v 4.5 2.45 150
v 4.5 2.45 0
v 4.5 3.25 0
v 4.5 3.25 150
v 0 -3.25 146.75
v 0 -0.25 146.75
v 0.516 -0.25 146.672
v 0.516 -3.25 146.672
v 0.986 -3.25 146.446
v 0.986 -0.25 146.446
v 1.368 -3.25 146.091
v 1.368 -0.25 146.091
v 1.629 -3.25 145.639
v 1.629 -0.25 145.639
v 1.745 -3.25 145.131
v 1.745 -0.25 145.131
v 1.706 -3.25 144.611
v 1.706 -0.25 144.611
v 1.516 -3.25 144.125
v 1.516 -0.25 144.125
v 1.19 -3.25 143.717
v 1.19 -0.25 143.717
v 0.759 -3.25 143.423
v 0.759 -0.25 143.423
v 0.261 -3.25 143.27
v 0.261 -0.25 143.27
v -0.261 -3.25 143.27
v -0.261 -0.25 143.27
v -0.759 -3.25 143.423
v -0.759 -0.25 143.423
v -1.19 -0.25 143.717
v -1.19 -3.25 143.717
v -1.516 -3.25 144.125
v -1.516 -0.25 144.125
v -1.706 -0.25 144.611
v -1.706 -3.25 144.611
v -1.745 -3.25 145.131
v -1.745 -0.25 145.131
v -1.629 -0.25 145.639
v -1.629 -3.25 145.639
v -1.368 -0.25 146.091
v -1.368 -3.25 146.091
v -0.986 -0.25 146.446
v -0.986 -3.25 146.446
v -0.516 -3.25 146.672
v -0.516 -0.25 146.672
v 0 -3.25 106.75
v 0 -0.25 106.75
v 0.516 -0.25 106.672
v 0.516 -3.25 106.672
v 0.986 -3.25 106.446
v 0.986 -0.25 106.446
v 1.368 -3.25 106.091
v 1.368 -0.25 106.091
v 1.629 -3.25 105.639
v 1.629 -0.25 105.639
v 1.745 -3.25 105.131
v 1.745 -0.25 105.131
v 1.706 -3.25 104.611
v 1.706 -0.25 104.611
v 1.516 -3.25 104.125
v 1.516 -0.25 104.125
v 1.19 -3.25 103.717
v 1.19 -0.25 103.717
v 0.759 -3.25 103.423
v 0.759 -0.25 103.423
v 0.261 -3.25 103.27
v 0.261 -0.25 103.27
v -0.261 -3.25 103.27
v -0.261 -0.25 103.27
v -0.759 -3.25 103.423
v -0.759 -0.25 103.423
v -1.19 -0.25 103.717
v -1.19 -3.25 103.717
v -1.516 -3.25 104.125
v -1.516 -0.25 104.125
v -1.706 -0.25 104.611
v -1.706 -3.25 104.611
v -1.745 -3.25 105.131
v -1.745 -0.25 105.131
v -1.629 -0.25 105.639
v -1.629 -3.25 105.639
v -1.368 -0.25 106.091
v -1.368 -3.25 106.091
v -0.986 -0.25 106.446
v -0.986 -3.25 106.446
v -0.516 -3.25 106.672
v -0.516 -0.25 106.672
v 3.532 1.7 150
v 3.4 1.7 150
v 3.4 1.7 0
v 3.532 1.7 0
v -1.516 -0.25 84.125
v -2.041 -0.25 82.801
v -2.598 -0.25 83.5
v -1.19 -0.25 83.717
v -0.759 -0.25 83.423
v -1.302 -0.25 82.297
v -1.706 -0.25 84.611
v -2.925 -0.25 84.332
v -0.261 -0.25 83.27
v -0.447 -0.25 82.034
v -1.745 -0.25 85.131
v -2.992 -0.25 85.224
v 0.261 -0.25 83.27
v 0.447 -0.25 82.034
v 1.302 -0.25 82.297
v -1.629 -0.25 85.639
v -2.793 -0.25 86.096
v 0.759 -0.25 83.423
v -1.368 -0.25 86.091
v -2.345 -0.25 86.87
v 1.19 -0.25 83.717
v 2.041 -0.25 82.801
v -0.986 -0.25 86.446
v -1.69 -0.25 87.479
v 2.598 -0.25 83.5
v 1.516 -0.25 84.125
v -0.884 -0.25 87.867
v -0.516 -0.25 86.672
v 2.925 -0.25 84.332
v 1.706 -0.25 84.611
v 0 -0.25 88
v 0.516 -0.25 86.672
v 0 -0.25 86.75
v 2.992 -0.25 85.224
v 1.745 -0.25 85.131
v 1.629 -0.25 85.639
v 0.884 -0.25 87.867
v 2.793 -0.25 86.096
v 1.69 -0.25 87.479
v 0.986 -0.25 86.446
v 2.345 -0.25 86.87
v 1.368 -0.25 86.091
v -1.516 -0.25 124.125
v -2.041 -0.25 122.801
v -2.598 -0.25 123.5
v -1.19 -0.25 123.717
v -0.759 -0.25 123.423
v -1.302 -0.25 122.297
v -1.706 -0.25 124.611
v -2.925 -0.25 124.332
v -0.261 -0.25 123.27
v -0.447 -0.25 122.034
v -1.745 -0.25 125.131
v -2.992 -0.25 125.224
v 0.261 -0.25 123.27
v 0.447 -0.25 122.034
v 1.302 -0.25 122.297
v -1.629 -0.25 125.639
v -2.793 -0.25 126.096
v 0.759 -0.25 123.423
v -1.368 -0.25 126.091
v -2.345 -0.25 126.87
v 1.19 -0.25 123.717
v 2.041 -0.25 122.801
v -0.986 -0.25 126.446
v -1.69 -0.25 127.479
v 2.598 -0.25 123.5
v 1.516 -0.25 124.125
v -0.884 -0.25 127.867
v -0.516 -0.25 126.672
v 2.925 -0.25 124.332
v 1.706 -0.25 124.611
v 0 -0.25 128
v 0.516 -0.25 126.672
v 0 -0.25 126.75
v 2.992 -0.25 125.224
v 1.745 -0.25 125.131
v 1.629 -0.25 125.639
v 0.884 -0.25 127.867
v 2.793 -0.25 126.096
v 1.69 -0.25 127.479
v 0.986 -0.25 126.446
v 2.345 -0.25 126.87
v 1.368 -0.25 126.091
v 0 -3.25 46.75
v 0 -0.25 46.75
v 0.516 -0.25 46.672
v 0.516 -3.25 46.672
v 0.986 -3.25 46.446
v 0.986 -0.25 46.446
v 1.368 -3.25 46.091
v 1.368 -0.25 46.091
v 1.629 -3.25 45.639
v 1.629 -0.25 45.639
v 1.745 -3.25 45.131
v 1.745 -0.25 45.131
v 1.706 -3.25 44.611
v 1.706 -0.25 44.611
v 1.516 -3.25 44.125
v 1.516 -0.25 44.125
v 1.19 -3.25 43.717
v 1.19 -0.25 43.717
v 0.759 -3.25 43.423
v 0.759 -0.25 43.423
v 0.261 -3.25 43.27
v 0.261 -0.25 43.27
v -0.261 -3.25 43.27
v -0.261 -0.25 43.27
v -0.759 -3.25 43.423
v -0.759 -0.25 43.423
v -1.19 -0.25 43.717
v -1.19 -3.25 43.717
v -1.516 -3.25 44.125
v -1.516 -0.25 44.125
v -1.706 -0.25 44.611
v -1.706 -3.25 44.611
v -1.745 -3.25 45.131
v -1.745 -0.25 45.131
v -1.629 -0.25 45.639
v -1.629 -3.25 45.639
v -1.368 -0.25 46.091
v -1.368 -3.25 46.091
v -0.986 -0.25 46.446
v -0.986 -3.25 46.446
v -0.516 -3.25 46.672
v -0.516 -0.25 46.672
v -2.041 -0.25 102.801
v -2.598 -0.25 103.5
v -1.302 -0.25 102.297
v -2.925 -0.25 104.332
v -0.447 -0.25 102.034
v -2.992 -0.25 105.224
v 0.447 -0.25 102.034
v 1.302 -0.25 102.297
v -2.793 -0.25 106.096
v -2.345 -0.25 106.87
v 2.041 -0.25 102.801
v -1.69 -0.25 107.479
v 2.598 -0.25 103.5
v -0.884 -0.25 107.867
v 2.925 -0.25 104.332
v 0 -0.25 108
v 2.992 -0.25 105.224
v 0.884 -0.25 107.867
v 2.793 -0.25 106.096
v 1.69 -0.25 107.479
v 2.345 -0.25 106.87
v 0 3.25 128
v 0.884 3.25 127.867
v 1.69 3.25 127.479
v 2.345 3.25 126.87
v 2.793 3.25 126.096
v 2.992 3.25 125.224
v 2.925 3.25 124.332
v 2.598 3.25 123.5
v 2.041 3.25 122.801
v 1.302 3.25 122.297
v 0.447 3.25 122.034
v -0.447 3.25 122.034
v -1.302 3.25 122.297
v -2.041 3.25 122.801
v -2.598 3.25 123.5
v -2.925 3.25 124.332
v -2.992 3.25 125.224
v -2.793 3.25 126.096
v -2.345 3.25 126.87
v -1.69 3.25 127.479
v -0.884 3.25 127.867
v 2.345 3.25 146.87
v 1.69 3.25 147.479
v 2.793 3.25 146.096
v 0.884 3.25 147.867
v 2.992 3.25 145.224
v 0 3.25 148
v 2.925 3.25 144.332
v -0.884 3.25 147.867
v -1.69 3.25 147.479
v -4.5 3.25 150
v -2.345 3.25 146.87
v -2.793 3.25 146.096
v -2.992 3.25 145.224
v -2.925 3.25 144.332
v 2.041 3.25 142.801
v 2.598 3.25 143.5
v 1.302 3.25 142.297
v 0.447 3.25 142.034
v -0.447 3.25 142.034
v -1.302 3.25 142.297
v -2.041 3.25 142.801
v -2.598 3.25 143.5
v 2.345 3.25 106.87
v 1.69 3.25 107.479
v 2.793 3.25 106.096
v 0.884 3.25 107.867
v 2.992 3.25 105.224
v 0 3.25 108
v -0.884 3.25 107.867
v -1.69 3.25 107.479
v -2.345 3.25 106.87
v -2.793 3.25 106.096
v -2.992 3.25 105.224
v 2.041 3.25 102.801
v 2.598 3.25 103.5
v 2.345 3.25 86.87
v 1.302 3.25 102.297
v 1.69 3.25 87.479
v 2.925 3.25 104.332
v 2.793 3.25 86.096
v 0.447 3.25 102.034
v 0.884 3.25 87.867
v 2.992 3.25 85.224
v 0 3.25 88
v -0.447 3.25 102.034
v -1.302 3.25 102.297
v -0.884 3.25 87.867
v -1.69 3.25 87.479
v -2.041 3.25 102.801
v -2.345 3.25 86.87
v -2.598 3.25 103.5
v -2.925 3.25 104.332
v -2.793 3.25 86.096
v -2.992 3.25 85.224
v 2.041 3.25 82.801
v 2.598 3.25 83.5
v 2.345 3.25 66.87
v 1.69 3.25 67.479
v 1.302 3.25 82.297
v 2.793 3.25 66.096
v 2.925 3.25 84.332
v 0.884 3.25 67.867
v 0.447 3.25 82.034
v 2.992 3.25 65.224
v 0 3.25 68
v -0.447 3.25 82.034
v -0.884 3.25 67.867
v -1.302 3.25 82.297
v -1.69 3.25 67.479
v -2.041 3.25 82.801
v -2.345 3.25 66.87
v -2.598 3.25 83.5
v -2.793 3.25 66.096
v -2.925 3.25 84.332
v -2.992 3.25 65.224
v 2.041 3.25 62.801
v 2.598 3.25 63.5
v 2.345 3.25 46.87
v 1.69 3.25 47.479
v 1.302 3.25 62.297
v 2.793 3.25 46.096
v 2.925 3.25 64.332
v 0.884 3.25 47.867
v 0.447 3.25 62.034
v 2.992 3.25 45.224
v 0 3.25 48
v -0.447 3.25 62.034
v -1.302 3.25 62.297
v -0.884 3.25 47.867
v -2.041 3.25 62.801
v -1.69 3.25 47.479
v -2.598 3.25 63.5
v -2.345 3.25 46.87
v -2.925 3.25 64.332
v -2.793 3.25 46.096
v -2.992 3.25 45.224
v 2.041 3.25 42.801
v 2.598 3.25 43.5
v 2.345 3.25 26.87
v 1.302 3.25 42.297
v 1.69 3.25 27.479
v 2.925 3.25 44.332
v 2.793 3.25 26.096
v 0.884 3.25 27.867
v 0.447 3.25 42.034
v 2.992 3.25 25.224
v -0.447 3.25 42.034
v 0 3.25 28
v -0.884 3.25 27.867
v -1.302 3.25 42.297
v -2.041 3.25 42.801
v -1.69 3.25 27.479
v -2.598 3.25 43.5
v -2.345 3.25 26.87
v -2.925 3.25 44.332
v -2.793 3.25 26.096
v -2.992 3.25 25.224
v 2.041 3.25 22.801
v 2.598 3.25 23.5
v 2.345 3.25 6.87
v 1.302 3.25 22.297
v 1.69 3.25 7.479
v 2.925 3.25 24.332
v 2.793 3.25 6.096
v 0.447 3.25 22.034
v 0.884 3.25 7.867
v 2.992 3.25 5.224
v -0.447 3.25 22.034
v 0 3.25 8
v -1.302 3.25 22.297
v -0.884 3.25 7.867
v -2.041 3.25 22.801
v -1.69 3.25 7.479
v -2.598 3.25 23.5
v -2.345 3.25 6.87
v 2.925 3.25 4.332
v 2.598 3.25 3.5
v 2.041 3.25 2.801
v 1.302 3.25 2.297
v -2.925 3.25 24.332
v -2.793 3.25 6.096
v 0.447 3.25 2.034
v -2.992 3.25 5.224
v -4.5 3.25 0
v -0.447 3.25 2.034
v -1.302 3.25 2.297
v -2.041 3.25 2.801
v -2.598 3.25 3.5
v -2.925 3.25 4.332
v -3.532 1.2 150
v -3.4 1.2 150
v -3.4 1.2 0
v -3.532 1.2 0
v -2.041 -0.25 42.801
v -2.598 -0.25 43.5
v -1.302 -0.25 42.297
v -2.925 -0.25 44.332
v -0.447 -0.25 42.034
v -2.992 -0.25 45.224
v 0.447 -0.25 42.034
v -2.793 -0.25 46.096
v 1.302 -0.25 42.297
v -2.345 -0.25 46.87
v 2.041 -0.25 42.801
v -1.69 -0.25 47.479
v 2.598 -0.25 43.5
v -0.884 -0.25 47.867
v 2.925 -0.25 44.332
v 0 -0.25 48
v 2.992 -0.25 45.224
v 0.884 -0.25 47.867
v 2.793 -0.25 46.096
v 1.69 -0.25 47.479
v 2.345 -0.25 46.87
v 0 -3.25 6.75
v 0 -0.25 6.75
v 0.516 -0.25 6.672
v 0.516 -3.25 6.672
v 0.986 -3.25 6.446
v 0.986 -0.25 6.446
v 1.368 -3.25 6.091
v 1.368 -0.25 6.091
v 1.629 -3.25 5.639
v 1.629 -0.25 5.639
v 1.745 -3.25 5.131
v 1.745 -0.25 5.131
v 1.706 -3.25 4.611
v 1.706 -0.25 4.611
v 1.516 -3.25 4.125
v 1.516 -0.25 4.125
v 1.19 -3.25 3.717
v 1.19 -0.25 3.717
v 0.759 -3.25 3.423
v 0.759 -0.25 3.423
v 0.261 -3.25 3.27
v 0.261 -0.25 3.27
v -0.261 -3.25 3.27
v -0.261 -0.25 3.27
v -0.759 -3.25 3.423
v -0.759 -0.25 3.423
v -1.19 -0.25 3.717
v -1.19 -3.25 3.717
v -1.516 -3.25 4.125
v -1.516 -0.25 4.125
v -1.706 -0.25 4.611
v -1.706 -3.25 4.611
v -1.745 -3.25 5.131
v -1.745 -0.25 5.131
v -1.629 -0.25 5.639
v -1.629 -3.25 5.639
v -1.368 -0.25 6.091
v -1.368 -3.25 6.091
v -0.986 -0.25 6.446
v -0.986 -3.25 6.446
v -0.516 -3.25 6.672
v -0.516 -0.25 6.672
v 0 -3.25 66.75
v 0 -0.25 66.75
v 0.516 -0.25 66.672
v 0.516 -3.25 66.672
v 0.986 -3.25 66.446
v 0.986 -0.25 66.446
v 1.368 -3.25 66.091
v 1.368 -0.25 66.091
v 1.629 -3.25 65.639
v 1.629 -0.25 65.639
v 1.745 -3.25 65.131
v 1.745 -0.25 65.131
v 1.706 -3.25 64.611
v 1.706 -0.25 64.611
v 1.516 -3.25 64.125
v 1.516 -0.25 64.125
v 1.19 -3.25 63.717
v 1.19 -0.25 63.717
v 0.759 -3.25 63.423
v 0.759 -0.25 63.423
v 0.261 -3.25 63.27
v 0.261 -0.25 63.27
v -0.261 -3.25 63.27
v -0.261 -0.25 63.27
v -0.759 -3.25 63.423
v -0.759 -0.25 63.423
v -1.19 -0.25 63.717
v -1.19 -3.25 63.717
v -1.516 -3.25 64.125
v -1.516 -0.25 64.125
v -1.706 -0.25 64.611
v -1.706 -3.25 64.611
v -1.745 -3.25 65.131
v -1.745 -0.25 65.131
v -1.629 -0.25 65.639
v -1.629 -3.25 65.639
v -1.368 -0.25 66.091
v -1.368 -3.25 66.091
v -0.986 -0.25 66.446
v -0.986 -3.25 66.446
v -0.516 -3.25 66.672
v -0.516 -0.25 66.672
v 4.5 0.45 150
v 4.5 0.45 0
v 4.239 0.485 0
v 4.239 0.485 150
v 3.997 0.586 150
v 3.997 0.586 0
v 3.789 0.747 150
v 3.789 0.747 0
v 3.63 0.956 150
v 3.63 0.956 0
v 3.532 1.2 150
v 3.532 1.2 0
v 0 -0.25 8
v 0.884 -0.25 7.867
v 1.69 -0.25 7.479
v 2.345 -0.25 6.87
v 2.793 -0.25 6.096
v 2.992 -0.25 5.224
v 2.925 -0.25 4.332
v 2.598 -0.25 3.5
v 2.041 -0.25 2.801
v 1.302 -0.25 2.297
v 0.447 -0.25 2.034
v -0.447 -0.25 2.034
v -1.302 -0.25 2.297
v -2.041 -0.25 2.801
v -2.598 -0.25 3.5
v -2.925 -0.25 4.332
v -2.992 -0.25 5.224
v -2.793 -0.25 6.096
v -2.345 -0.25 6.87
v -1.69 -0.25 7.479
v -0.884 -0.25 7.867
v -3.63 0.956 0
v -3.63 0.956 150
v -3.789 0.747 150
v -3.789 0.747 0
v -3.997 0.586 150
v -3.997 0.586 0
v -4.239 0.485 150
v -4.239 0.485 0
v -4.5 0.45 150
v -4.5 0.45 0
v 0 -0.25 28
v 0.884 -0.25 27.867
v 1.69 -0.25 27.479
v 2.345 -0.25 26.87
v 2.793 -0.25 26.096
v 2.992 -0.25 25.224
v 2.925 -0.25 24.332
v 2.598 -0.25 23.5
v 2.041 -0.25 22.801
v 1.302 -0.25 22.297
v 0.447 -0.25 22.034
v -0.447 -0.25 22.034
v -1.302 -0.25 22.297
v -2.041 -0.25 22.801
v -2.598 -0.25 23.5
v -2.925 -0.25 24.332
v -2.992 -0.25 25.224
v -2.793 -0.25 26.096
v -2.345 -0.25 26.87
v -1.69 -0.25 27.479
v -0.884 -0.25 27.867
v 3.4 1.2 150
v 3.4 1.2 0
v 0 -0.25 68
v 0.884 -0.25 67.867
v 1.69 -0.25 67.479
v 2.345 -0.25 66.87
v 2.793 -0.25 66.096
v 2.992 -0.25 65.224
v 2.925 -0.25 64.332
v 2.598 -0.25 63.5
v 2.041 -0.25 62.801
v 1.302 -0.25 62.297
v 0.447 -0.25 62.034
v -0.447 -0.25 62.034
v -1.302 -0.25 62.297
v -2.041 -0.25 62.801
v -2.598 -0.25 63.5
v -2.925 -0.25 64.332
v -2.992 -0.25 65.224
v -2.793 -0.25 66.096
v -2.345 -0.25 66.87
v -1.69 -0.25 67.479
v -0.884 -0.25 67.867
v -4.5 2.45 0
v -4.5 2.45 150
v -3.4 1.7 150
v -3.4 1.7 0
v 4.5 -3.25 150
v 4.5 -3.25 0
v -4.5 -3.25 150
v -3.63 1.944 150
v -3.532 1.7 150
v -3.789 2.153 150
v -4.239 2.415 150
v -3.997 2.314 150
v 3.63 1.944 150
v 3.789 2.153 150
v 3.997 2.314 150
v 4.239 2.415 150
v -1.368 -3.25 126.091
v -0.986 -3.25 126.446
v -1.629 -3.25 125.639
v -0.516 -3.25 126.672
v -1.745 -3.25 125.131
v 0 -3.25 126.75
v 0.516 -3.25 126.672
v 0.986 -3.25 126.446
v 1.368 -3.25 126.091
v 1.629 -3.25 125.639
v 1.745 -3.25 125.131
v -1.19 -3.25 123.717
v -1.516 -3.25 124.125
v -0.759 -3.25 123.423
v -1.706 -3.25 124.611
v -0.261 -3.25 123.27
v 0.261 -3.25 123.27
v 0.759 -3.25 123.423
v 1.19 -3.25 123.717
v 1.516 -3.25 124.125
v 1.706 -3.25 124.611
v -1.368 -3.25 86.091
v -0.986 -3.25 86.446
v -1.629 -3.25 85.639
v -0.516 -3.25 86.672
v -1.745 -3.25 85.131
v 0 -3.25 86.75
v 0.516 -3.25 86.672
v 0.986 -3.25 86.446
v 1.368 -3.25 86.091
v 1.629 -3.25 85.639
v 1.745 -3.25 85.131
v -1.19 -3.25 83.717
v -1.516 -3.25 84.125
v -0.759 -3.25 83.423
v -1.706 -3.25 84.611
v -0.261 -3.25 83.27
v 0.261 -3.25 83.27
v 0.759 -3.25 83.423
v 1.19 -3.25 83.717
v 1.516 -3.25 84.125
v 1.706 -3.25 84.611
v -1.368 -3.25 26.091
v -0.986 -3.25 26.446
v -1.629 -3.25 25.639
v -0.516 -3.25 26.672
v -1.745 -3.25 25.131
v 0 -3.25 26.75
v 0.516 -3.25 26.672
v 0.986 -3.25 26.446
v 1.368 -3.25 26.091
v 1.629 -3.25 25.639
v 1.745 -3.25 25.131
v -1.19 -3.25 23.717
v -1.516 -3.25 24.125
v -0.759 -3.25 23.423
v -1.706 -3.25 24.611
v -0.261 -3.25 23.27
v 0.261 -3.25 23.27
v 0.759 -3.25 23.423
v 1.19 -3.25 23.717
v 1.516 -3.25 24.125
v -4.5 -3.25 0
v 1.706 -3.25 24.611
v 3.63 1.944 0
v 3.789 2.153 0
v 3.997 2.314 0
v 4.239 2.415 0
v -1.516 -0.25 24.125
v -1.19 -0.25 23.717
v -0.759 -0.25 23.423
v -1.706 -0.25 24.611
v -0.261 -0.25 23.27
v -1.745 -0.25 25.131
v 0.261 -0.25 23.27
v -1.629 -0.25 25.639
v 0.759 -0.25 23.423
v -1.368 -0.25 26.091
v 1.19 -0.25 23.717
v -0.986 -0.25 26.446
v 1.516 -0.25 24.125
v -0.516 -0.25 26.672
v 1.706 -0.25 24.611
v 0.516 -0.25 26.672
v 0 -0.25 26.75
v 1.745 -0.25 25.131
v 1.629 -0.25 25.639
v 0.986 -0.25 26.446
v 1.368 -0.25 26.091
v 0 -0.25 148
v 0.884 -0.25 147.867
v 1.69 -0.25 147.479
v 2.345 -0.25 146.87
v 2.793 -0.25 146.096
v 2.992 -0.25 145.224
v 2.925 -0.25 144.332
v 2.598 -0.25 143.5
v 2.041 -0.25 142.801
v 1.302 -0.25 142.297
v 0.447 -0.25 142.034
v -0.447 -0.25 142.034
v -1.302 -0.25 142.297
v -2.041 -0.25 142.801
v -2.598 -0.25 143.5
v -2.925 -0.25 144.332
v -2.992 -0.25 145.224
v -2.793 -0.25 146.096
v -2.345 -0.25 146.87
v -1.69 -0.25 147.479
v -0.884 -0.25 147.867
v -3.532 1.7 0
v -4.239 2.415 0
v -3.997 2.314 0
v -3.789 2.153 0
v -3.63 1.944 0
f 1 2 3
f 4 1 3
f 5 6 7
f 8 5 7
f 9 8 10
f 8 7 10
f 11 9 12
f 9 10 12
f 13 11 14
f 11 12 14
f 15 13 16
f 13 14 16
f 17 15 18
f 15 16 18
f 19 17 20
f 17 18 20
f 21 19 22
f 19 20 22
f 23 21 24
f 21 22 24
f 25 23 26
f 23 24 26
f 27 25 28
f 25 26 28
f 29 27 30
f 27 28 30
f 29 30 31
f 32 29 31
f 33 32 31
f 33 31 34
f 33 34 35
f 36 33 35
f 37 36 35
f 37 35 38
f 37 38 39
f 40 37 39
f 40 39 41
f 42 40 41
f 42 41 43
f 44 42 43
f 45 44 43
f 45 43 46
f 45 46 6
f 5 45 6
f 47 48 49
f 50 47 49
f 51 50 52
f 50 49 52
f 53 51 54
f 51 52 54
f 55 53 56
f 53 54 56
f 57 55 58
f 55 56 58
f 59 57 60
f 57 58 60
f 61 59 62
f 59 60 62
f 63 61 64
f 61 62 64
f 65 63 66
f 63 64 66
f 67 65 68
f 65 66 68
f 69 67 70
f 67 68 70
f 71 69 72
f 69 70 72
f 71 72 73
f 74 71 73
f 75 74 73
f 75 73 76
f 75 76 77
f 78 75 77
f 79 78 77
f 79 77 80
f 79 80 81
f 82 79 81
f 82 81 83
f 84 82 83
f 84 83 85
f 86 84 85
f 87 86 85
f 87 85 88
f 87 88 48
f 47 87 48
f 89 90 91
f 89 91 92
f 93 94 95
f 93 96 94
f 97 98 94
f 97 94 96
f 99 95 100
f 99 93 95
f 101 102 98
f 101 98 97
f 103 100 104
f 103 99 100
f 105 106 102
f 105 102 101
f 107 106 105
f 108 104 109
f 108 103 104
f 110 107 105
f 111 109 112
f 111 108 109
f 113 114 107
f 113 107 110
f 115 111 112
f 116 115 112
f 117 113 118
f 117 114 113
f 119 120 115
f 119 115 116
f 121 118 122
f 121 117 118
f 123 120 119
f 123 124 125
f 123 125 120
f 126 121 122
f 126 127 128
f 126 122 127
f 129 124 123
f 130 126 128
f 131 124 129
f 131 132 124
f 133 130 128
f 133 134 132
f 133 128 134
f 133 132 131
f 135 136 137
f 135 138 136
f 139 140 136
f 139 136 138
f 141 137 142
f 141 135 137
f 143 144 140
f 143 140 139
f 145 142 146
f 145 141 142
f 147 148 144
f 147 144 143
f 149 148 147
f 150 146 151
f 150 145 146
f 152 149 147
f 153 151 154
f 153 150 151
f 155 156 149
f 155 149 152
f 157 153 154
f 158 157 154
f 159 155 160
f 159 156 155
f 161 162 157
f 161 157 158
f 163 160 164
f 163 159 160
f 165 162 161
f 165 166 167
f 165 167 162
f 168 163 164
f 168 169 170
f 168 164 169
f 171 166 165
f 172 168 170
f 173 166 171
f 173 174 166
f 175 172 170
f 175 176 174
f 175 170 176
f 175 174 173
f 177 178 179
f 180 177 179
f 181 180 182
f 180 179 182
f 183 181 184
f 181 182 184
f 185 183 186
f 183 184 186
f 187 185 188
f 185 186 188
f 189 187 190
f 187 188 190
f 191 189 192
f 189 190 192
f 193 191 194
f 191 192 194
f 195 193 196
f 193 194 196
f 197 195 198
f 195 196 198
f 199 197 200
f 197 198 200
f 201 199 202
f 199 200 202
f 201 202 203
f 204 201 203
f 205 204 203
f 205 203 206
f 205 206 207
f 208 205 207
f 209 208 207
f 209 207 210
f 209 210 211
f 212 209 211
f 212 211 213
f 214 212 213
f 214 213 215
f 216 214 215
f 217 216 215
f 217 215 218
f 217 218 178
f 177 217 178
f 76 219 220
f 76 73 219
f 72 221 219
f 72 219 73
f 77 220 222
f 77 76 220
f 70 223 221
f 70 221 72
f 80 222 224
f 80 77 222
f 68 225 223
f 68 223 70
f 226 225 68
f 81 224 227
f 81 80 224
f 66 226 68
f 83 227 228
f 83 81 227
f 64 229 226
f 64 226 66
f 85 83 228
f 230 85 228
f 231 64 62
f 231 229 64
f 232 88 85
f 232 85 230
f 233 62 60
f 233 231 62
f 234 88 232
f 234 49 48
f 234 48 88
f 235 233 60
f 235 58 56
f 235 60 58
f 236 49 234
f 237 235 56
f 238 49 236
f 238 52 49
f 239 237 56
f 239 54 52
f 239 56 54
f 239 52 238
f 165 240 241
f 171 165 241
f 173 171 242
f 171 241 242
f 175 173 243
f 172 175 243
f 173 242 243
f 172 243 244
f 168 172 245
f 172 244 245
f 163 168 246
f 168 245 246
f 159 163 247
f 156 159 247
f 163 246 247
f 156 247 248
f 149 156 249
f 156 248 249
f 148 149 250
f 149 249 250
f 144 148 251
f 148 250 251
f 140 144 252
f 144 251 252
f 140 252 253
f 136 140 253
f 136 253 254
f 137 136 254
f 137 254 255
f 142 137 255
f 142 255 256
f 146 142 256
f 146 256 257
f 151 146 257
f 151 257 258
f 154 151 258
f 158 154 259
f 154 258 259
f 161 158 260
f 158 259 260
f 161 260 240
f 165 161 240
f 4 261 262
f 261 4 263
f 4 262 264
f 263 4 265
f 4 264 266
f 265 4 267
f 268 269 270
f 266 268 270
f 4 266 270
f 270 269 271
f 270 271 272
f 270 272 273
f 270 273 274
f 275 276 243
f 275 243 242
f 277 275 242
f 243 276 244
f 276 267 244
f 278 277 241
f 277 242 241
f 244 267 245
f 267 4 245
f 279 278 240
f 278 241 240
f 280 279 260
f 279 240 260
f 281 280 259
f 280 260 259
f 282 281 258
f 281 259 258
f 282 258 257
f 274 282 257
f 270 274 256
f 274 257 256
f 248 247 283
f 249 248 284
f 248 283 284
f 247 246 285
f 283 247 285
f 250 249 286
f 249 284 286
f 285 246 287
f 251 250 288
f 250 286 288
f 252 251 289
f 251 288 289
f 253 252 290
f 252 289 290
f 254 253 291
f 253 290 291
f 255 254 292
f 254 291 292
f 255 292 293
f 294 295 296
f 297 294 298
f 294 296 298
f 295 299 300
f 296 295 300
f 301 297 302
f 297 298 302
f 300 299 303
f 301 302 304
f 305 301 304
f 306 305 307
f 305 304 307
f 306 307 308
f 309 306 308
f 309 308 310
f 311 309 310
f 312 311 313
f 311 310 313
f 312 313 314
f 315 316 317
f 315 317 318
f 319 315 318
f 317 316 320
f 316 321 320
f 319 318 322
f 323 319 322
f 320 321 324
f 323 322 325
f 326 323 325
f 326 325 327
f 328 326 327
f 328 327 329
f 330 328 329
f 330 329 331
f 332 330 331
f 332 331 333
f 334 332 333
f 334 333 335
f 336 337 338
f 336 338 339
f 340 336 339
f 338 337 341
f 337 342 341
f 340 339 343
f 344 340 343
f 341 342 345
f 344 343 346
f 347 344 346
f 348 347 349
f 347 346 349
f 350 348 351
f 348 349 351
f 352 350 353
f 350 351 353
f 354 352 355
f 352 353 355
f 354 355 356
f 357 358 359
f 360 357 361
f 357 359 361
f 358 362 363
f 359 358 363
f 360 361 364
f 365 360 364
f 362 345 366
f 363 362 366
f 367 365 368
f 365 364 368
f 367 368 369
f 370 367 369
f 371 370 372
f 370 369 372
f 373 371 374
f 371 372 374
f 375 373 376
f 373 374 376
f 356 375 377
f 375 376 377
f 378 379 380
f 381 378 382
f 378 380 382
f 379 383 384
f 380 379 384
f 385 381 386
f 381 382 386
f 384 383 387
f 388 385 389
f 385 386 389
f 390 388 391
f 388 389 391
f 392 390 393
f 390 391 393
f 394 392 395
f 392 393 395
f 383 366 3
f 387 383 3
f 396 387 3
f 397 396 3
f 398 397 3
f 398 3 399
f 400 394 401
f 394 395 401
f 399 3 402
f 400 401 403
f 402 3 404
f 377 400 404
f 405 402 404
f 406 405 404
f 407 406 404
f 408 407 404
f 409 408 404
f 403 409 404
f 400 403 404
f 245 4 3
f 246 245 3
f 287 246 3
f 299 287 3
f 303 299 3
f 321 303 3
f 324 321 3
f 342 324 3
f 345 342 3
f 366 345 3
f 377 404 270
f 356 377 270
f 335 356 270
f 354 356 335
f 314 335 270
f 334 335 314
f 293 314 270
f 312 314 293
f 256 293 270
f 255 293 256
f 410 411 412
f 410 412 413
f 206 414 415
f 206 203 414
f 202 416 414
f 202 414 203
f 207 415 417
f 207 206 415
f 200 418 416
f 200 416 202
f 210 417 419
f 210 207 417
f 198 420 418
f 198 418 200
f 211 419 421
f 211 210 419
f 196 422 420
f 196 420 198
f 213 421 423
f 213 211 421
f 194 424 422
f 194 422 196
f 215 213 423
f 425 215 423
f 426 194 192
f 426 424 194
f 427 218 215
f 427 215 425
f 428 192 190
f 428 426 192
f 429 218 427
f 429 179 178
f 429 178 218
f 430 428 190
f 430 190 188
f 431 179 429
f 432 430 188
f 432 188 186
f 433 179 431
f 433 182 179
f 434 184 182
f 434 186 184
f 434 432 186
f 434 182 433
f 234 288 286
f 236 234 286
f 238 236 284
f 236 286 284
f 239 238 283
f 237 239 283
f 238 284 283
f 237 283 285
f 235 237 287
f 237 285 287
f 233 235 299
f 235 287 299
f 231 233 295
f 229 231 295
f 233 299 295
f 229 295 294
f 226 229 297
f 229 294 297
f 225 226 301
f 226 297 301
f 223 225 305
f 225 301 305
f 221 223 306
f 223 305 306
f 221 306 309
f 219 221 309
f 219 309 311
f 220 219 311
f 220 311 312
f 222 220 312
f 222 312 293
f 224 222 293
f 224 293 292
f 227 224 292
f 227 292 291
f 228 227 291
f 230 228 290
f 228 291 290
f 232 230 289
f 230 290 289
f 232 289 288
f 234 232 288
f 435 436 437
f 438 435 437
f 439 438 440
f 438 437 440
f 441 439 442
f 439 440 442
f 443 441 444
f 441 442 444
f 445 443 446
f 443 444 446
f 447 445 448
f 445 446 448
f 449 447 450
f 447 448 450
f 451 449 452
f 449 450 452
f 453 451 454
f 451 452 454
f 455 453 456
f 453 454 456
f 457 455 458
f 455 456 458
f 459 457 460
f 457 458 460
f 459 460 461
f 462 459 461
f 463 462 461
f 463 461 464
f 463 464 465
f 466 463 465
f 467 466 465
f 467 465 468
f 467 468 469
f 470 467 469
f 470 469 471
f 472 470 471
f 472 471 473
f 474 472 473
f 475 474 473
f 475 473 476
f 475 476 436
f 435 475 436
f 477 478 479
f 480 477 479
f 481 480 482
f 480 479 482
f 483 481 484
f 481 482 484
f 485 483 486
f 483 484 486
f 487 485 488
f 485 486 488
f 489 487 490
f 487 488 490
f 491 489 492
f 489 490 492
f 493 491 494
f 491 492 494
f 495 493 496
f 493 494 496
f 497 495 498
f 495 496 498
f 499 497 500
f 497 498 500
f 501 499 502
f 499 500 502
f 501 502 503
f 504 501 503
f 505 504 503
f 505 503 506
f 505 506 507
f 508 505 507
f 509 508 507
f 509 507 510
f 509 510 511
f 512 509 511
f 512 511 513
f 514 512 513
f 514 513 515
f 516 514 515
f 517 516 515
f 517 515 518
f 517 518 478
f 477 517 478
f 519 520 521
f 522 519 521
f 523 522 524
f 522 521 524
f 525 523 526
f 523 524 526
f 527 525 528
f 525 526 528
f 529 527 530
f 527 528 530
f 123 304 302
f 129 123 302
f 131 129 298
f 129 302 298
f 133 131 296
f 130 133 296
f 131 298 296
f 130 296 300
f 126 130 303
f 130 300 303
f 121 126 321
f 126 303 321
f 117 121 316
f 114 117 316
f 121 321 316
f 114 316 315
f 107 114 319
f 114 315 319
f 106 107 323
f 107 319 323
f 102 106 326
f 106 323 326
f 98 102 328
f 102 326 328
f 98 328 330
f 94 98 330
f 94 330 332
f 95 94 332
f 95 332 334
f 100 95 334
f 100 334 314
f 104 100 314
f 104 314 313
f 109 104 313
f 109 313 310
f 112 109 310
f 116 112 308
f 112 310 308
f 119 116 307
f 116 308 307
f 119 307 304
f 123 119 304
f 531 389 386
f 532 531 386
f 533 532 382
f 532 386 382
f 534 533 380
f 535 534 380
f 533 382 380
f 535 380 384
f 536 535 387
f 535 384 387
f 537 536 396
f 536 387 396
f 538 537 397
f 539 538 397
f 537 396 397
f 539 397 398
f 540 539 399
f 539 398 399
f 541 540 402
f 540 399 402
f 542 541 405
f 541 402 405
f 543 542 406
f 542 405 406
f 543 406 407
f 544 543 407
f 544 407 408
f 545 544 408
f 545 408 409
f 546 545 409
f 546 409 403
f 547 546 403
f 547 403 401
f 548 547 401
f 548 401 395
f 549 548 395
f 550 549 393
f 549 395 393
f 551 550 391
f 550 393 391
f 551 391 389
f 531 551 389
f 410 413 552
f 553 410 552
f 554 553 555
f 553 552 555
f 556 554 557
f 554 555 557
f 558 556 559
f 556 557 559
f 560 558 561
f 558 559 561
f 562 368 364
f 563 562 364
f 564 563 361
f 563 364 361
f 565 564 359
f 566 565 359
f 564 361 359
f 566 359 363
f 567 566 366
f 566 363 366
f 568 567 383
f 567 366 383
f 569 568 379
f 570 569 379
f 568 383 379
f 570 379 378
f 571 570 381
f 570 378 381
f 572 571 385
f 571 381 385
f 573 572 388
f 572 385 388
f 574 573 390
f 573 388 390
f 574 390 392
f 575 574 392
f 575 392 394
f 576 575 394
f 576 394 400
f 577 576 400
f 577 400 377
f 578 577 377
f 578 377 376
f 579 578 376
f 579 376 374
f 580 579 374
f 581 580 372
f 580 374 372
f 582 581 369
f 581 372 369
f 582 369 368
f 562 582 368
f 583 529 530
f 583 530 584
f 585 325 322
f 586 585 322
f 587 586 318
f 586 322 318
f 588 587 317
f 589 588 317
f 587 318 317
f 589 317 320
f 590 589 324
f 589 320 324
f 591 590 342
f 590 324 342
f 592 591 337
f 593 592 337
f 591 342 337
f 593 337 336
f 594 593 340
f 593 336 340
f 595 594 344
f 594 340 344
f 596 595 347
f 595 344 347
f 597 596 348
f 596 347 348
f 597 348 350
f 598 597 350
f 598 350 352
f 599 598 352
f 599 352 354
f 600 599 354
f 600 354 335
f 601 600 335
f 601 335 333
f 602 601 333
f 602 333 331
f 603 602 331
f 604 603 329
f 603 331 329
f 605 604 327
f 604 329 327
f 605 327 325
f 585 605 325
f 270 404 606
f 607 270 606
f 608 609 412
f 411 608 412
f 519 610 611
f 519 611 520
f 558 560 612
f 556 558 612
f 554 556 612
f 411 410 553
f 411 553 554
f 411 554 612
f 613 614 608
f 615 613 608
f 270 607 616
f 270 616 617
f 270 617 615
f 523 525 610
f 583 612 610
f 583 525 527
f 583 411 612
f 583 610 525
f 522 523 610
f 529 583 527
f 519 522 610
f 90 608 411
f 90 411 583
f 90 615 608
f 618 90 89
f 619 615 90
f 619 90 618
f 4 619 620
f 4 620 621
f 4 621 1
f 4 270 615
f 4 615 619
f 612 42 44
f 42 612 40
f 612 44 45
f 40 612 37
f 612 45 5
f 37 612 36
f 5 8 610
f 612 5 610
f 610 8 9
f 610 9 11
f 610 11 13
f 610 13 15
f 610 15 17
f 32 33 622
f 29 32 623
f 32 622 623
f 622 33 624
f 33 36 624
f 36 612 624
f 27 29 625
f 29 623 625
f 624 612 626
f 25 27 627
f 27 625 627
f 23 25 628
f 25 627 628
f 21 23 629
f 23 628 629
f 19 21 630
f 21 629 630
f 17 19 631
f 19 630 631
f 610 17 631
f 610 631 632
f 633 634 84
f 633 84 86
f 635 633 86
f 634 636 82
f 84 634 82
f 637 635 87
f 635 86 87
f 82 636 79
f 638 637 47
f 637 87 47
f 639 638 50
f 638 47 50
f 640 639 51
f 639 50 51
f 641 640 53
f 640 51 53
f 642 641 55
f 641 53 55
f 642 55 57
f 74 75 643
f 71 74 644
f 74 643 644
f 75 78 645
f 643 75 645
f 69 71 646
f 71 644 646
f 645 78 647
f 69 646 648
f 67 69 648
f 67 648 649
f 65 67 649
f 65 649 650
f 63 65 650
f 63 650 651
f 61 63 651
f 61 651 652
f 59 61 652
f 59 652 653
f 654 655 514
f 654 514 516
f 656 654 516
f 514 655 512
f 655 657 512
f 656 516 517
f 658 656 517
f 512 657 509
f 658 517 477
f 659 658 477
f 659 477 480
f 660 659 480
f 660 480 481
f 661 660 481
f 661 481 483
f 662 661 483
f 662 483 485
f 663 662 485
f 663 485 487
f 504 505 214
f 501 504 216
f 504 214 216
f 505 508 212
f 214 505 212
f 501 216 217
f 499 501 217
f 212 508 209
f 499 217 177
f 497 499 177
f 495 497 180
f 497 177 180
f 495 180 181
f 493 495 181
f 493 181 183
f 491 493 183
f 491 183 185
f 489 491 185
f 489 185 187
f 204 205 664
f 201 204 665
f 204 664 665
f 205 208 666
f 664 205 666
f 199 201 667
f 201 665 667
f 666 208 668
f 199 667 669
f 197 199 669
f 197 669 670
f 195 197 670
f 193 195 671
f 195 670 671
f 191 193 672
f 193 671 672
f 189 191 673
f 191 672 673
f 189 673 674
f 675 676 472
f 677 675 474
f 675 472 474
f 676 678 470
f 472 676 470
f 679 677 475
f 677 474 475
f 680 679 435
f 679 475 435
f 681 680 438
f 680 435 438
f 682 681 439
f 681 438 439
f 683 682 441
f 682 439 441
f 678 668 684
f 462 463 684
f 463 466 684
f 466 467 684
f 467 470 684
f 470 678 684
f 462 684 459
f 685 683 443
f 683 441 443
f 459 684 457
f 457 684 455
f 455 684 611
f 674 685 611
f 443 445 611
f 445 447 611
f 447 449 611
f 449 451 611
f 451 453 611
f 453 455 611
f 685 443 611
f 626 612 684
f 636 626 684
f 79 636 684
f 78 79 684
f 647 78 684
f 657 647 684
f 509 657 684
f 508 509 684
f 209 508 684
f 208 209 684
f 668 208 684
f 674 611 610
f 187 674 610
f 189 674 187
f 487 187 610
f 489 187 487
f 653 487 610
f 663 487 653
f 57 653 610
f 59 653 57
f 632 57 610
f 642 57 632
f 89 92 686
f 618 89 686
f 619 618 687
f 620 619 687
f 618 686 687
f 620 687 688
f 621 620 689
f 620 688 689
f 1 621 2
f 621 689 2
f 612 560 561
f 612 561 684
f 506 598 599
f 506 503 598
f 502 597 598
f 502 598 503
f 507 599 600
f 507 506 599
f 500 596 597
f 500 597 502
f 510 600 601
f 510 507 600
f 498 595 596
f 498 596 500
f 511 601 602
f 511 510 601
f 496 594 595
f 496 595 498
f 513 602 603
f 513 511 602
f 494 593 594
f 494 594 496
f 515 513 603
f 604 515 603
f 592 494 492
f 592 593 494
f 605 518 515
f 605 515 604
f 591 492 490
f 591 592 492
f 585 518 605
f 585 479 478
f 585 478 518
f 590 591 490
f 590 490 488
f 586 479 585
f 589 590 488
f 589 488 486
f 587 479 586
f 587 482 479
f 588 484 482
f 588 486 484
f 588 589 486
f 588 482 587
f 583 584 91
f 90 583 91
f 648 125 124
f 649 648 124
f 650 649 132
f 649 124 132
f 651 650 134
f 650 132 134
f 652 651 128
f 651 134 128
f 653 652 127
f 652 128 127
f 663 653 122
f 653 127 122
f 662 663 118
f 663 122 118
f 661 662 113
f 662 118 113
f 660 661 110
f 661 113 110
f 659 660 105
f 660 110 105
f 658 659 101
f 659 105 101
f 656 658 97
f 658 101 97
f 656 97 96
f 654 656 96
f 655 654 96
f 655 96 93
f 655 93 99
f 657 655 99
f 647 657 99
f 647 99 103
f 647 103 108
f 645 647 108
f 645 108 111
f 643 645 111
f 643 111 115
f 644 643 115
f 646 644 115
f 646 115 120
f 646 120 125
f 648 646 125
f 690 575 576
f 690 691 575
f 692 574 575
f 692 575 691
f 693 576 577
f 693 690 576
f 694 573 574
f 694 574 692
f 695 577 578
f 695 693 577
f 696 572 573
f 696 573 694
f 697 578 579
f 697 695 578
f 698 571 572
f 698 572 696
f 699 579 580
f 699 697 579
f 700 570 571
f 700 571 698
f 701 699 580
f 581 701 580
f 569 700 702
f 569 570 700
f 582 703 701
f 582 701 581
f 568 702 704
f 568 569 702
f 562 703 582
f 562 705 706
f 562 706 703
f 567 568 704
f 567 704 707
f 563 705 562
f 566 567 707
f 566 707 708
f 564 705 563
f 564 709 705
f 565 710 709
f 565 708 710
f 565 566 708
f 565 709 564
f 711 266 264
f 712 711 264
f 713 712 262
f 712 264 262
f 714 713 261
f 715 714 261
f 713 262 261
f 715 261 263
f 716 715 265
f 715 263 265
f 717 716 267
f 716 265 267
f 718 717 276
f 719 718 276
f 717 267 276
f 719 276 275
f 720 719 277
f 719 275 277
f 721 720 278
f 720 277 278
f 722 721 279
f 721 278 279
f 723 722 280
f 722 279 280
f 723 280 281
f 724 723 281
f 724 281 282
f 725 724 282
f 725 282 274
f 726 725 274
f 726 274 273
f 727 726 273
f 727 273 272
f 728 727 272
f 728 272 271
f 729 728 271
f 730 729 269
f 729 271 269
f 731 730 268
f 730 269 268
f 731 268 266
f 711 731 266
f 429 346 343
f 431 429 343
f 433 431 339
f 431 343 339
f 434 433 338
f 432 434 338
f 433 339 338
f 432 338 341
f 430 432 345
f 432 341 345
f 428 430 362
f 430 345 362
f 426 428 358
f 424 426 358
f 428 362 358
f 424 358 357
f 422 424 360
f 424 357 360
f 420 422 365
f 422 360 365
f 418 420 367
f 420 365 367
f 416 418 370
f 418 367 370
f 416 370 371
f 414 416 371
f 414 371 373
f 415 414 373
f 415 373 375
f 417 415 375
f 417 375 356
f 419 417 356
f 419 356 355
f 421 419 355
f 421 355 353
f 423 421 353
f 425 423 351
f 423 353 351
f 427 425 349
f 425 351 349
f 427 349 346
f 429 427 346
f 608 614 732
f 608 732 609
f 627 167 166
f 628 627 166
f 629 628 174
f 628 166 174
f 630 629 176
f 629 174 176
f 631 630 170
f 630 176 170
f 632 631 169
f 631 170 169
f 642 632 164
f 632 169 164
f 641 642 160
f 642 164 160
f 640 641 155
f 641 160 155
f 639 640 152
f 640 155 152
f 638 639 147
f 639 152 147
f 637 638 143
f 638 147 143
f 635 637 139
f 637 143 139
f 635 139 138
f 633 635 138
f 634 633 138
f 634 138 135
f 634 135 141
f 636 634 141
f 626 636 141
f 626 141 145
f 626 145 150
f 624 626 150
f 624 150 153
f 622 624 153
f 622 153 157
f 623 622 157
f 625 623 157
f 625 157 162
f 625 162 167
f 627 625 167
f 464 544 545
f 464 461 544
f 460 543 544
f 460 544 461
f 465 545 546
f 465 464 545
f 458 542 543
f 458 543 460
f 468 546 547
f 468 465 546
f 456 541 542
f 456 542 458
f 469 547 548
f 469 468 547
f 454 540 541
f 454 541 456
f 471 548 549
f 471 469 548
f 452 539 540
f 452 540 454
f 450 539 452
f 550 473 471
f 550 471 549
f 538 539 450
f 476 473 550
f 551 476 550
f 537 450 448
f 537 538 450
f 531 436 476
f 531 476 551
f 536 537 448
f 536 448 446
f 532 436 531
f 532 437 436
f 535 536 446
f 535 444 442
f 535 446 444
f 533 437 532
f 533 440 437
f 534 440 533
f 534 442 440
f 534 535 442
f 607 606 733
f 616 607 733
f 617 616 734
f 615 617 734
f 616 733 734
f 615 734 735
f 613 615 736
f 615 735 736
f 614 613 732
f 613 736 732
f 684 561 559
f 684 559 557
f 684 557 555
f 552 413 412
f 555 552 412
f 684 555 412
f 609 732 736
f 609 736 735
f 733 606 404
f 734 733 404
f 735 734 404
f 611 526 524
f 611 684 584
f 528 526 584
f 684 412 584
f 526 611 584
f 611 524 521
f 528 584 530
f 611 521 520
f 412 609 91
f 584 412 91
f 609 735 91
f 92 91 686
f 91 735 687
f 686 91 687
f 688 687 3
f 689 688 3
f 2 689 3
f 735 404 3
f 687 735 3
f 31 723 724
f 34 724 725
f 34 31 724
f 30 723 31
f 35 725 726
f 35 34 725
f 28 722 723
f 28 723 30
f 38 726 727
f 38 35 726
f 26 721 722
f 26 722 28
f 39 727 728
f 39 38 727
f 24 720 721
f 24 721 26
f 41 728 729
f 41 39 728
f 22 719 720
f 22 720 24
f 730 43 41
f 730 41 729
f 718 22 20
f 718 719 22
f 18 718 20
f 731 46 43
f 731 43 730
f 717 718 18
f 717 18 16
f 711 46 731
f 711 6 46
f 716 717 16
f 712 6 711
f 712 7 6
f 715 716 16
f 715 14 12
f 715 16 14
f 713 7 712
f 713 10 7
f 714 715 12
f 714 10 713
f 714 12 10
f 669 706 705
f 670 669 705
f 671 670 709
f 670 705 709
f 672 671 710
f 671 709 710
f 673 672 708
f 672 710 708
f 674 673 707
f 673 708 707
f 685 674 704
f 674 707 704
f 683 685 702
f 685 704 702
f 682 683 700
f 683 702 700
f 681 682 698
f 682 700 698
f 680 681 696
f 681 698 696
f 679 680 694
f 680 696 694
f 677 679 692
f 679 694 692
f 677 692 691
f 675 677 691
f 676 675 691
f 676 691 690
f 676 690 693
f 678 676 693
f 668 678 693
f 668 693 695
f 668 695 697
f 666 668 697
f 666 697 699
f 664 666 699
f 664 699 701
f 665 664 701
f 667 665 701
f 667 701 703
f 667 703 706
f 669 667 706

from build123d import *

# Parameters (mm, degrees)
EXTRUDE1_DEPTH  = 150
SKETCH2_R       = 3
EXTRUDE2_DEPTH  = 3.5
SKETCH_R        = 1.75
EXTRUDE3_DEPTH  = 151.208188858
LPATTERN1_COUNT = 40
LPATTERN1_PITCH = 20


with BuildPart() as part:
    # Sketch1 → Extrude1 (new body)
    with BuildSketch(Plane.XY):
        with BuildLine():
            Line((-4.5, -3.25), (4.5, -3.25))
            Line((4.5, -3.25), (4.5, 0.45))
            ThreePointArc((4.5, 0.45), (3.887627564, 0.659430585), (3.531754163, 1.2))
            Line((3.531754163, 1.2), (3.4, 1.2))
            Line((3.4, 1.2), (3.4, 1.7))
            Line((3.4, 1.7), (3.531754163, 1.7))
            ThreePointArc((3.531754163, 1.7), (3.887627564, 2.240569415), (4.5, 2.45))
            Line((4.5, 2.45), (4.5, 3.25))
            Line((4.5, 3.25), (-4.5, 3.25))
            Line((-4.5, 3.25), (-4.5, 2.45))
            ThreePointArc((-4.5, 2.45), (-3.887627564, 2.240569415), (-3.531754163, 1.7))
            Line((-3.531754163, 1.7), (-3.4, 1.7))
            Line((-3.4, 1.7), (-3.4, 1.2))
            Line((-3.4, 1.2), (-3.531754163, 1.2))
            ThreePointArc((-3.531754163, 1.2), (-3.887627564, 0.659430585), (-4.5, 0.45))
            Line((-4.5, 0.45), (-4.5, -3.25))
        make_face()
    extrude(amount=EXTRUDE1_DEPTH)

    # Sketch2 → Extrude2 (cut)
    with BuildSketch(Plane(origin=(0, 3.25, 0), x_dir=(1, 0, 0), z_dir=(0, 1, 0))):
        with Locations(Location((0, -5, 0), (0, 0, 270))):
            Circle(SKETCH2_R)
    extrude2 = extrude(amount=-EXTRUDE2_DEPTH, mode=Mode.SUBTRACT)

    # Sketch → Extrude3 (cut, through all)
    with BuildSketch(Plane(origin=(0, 3.25, 0), x_dir=(1, 0, 0), z_dir=(0, 1, 0))):
        with Locations(Location((0, -5, 0), (0, 0, 270))):
            Circle(SKETCH_R)
    extrude3 = extrude(amount=-EXTRUDE3_DEPTH, mode=Mode.SUBTRACT)

    # LPattern1: Extrude2, Extrude3 ×40
    with Locations(*[(0, 0, i * LPATTERN1_PITCH) for i in range(1, LPATTERN1_COUNT)]):
        add(extrude2, mode=Mode.SUBTRACT)
        add(extrude3, mode=Mode.SUBTRACT)


solid = part.part
